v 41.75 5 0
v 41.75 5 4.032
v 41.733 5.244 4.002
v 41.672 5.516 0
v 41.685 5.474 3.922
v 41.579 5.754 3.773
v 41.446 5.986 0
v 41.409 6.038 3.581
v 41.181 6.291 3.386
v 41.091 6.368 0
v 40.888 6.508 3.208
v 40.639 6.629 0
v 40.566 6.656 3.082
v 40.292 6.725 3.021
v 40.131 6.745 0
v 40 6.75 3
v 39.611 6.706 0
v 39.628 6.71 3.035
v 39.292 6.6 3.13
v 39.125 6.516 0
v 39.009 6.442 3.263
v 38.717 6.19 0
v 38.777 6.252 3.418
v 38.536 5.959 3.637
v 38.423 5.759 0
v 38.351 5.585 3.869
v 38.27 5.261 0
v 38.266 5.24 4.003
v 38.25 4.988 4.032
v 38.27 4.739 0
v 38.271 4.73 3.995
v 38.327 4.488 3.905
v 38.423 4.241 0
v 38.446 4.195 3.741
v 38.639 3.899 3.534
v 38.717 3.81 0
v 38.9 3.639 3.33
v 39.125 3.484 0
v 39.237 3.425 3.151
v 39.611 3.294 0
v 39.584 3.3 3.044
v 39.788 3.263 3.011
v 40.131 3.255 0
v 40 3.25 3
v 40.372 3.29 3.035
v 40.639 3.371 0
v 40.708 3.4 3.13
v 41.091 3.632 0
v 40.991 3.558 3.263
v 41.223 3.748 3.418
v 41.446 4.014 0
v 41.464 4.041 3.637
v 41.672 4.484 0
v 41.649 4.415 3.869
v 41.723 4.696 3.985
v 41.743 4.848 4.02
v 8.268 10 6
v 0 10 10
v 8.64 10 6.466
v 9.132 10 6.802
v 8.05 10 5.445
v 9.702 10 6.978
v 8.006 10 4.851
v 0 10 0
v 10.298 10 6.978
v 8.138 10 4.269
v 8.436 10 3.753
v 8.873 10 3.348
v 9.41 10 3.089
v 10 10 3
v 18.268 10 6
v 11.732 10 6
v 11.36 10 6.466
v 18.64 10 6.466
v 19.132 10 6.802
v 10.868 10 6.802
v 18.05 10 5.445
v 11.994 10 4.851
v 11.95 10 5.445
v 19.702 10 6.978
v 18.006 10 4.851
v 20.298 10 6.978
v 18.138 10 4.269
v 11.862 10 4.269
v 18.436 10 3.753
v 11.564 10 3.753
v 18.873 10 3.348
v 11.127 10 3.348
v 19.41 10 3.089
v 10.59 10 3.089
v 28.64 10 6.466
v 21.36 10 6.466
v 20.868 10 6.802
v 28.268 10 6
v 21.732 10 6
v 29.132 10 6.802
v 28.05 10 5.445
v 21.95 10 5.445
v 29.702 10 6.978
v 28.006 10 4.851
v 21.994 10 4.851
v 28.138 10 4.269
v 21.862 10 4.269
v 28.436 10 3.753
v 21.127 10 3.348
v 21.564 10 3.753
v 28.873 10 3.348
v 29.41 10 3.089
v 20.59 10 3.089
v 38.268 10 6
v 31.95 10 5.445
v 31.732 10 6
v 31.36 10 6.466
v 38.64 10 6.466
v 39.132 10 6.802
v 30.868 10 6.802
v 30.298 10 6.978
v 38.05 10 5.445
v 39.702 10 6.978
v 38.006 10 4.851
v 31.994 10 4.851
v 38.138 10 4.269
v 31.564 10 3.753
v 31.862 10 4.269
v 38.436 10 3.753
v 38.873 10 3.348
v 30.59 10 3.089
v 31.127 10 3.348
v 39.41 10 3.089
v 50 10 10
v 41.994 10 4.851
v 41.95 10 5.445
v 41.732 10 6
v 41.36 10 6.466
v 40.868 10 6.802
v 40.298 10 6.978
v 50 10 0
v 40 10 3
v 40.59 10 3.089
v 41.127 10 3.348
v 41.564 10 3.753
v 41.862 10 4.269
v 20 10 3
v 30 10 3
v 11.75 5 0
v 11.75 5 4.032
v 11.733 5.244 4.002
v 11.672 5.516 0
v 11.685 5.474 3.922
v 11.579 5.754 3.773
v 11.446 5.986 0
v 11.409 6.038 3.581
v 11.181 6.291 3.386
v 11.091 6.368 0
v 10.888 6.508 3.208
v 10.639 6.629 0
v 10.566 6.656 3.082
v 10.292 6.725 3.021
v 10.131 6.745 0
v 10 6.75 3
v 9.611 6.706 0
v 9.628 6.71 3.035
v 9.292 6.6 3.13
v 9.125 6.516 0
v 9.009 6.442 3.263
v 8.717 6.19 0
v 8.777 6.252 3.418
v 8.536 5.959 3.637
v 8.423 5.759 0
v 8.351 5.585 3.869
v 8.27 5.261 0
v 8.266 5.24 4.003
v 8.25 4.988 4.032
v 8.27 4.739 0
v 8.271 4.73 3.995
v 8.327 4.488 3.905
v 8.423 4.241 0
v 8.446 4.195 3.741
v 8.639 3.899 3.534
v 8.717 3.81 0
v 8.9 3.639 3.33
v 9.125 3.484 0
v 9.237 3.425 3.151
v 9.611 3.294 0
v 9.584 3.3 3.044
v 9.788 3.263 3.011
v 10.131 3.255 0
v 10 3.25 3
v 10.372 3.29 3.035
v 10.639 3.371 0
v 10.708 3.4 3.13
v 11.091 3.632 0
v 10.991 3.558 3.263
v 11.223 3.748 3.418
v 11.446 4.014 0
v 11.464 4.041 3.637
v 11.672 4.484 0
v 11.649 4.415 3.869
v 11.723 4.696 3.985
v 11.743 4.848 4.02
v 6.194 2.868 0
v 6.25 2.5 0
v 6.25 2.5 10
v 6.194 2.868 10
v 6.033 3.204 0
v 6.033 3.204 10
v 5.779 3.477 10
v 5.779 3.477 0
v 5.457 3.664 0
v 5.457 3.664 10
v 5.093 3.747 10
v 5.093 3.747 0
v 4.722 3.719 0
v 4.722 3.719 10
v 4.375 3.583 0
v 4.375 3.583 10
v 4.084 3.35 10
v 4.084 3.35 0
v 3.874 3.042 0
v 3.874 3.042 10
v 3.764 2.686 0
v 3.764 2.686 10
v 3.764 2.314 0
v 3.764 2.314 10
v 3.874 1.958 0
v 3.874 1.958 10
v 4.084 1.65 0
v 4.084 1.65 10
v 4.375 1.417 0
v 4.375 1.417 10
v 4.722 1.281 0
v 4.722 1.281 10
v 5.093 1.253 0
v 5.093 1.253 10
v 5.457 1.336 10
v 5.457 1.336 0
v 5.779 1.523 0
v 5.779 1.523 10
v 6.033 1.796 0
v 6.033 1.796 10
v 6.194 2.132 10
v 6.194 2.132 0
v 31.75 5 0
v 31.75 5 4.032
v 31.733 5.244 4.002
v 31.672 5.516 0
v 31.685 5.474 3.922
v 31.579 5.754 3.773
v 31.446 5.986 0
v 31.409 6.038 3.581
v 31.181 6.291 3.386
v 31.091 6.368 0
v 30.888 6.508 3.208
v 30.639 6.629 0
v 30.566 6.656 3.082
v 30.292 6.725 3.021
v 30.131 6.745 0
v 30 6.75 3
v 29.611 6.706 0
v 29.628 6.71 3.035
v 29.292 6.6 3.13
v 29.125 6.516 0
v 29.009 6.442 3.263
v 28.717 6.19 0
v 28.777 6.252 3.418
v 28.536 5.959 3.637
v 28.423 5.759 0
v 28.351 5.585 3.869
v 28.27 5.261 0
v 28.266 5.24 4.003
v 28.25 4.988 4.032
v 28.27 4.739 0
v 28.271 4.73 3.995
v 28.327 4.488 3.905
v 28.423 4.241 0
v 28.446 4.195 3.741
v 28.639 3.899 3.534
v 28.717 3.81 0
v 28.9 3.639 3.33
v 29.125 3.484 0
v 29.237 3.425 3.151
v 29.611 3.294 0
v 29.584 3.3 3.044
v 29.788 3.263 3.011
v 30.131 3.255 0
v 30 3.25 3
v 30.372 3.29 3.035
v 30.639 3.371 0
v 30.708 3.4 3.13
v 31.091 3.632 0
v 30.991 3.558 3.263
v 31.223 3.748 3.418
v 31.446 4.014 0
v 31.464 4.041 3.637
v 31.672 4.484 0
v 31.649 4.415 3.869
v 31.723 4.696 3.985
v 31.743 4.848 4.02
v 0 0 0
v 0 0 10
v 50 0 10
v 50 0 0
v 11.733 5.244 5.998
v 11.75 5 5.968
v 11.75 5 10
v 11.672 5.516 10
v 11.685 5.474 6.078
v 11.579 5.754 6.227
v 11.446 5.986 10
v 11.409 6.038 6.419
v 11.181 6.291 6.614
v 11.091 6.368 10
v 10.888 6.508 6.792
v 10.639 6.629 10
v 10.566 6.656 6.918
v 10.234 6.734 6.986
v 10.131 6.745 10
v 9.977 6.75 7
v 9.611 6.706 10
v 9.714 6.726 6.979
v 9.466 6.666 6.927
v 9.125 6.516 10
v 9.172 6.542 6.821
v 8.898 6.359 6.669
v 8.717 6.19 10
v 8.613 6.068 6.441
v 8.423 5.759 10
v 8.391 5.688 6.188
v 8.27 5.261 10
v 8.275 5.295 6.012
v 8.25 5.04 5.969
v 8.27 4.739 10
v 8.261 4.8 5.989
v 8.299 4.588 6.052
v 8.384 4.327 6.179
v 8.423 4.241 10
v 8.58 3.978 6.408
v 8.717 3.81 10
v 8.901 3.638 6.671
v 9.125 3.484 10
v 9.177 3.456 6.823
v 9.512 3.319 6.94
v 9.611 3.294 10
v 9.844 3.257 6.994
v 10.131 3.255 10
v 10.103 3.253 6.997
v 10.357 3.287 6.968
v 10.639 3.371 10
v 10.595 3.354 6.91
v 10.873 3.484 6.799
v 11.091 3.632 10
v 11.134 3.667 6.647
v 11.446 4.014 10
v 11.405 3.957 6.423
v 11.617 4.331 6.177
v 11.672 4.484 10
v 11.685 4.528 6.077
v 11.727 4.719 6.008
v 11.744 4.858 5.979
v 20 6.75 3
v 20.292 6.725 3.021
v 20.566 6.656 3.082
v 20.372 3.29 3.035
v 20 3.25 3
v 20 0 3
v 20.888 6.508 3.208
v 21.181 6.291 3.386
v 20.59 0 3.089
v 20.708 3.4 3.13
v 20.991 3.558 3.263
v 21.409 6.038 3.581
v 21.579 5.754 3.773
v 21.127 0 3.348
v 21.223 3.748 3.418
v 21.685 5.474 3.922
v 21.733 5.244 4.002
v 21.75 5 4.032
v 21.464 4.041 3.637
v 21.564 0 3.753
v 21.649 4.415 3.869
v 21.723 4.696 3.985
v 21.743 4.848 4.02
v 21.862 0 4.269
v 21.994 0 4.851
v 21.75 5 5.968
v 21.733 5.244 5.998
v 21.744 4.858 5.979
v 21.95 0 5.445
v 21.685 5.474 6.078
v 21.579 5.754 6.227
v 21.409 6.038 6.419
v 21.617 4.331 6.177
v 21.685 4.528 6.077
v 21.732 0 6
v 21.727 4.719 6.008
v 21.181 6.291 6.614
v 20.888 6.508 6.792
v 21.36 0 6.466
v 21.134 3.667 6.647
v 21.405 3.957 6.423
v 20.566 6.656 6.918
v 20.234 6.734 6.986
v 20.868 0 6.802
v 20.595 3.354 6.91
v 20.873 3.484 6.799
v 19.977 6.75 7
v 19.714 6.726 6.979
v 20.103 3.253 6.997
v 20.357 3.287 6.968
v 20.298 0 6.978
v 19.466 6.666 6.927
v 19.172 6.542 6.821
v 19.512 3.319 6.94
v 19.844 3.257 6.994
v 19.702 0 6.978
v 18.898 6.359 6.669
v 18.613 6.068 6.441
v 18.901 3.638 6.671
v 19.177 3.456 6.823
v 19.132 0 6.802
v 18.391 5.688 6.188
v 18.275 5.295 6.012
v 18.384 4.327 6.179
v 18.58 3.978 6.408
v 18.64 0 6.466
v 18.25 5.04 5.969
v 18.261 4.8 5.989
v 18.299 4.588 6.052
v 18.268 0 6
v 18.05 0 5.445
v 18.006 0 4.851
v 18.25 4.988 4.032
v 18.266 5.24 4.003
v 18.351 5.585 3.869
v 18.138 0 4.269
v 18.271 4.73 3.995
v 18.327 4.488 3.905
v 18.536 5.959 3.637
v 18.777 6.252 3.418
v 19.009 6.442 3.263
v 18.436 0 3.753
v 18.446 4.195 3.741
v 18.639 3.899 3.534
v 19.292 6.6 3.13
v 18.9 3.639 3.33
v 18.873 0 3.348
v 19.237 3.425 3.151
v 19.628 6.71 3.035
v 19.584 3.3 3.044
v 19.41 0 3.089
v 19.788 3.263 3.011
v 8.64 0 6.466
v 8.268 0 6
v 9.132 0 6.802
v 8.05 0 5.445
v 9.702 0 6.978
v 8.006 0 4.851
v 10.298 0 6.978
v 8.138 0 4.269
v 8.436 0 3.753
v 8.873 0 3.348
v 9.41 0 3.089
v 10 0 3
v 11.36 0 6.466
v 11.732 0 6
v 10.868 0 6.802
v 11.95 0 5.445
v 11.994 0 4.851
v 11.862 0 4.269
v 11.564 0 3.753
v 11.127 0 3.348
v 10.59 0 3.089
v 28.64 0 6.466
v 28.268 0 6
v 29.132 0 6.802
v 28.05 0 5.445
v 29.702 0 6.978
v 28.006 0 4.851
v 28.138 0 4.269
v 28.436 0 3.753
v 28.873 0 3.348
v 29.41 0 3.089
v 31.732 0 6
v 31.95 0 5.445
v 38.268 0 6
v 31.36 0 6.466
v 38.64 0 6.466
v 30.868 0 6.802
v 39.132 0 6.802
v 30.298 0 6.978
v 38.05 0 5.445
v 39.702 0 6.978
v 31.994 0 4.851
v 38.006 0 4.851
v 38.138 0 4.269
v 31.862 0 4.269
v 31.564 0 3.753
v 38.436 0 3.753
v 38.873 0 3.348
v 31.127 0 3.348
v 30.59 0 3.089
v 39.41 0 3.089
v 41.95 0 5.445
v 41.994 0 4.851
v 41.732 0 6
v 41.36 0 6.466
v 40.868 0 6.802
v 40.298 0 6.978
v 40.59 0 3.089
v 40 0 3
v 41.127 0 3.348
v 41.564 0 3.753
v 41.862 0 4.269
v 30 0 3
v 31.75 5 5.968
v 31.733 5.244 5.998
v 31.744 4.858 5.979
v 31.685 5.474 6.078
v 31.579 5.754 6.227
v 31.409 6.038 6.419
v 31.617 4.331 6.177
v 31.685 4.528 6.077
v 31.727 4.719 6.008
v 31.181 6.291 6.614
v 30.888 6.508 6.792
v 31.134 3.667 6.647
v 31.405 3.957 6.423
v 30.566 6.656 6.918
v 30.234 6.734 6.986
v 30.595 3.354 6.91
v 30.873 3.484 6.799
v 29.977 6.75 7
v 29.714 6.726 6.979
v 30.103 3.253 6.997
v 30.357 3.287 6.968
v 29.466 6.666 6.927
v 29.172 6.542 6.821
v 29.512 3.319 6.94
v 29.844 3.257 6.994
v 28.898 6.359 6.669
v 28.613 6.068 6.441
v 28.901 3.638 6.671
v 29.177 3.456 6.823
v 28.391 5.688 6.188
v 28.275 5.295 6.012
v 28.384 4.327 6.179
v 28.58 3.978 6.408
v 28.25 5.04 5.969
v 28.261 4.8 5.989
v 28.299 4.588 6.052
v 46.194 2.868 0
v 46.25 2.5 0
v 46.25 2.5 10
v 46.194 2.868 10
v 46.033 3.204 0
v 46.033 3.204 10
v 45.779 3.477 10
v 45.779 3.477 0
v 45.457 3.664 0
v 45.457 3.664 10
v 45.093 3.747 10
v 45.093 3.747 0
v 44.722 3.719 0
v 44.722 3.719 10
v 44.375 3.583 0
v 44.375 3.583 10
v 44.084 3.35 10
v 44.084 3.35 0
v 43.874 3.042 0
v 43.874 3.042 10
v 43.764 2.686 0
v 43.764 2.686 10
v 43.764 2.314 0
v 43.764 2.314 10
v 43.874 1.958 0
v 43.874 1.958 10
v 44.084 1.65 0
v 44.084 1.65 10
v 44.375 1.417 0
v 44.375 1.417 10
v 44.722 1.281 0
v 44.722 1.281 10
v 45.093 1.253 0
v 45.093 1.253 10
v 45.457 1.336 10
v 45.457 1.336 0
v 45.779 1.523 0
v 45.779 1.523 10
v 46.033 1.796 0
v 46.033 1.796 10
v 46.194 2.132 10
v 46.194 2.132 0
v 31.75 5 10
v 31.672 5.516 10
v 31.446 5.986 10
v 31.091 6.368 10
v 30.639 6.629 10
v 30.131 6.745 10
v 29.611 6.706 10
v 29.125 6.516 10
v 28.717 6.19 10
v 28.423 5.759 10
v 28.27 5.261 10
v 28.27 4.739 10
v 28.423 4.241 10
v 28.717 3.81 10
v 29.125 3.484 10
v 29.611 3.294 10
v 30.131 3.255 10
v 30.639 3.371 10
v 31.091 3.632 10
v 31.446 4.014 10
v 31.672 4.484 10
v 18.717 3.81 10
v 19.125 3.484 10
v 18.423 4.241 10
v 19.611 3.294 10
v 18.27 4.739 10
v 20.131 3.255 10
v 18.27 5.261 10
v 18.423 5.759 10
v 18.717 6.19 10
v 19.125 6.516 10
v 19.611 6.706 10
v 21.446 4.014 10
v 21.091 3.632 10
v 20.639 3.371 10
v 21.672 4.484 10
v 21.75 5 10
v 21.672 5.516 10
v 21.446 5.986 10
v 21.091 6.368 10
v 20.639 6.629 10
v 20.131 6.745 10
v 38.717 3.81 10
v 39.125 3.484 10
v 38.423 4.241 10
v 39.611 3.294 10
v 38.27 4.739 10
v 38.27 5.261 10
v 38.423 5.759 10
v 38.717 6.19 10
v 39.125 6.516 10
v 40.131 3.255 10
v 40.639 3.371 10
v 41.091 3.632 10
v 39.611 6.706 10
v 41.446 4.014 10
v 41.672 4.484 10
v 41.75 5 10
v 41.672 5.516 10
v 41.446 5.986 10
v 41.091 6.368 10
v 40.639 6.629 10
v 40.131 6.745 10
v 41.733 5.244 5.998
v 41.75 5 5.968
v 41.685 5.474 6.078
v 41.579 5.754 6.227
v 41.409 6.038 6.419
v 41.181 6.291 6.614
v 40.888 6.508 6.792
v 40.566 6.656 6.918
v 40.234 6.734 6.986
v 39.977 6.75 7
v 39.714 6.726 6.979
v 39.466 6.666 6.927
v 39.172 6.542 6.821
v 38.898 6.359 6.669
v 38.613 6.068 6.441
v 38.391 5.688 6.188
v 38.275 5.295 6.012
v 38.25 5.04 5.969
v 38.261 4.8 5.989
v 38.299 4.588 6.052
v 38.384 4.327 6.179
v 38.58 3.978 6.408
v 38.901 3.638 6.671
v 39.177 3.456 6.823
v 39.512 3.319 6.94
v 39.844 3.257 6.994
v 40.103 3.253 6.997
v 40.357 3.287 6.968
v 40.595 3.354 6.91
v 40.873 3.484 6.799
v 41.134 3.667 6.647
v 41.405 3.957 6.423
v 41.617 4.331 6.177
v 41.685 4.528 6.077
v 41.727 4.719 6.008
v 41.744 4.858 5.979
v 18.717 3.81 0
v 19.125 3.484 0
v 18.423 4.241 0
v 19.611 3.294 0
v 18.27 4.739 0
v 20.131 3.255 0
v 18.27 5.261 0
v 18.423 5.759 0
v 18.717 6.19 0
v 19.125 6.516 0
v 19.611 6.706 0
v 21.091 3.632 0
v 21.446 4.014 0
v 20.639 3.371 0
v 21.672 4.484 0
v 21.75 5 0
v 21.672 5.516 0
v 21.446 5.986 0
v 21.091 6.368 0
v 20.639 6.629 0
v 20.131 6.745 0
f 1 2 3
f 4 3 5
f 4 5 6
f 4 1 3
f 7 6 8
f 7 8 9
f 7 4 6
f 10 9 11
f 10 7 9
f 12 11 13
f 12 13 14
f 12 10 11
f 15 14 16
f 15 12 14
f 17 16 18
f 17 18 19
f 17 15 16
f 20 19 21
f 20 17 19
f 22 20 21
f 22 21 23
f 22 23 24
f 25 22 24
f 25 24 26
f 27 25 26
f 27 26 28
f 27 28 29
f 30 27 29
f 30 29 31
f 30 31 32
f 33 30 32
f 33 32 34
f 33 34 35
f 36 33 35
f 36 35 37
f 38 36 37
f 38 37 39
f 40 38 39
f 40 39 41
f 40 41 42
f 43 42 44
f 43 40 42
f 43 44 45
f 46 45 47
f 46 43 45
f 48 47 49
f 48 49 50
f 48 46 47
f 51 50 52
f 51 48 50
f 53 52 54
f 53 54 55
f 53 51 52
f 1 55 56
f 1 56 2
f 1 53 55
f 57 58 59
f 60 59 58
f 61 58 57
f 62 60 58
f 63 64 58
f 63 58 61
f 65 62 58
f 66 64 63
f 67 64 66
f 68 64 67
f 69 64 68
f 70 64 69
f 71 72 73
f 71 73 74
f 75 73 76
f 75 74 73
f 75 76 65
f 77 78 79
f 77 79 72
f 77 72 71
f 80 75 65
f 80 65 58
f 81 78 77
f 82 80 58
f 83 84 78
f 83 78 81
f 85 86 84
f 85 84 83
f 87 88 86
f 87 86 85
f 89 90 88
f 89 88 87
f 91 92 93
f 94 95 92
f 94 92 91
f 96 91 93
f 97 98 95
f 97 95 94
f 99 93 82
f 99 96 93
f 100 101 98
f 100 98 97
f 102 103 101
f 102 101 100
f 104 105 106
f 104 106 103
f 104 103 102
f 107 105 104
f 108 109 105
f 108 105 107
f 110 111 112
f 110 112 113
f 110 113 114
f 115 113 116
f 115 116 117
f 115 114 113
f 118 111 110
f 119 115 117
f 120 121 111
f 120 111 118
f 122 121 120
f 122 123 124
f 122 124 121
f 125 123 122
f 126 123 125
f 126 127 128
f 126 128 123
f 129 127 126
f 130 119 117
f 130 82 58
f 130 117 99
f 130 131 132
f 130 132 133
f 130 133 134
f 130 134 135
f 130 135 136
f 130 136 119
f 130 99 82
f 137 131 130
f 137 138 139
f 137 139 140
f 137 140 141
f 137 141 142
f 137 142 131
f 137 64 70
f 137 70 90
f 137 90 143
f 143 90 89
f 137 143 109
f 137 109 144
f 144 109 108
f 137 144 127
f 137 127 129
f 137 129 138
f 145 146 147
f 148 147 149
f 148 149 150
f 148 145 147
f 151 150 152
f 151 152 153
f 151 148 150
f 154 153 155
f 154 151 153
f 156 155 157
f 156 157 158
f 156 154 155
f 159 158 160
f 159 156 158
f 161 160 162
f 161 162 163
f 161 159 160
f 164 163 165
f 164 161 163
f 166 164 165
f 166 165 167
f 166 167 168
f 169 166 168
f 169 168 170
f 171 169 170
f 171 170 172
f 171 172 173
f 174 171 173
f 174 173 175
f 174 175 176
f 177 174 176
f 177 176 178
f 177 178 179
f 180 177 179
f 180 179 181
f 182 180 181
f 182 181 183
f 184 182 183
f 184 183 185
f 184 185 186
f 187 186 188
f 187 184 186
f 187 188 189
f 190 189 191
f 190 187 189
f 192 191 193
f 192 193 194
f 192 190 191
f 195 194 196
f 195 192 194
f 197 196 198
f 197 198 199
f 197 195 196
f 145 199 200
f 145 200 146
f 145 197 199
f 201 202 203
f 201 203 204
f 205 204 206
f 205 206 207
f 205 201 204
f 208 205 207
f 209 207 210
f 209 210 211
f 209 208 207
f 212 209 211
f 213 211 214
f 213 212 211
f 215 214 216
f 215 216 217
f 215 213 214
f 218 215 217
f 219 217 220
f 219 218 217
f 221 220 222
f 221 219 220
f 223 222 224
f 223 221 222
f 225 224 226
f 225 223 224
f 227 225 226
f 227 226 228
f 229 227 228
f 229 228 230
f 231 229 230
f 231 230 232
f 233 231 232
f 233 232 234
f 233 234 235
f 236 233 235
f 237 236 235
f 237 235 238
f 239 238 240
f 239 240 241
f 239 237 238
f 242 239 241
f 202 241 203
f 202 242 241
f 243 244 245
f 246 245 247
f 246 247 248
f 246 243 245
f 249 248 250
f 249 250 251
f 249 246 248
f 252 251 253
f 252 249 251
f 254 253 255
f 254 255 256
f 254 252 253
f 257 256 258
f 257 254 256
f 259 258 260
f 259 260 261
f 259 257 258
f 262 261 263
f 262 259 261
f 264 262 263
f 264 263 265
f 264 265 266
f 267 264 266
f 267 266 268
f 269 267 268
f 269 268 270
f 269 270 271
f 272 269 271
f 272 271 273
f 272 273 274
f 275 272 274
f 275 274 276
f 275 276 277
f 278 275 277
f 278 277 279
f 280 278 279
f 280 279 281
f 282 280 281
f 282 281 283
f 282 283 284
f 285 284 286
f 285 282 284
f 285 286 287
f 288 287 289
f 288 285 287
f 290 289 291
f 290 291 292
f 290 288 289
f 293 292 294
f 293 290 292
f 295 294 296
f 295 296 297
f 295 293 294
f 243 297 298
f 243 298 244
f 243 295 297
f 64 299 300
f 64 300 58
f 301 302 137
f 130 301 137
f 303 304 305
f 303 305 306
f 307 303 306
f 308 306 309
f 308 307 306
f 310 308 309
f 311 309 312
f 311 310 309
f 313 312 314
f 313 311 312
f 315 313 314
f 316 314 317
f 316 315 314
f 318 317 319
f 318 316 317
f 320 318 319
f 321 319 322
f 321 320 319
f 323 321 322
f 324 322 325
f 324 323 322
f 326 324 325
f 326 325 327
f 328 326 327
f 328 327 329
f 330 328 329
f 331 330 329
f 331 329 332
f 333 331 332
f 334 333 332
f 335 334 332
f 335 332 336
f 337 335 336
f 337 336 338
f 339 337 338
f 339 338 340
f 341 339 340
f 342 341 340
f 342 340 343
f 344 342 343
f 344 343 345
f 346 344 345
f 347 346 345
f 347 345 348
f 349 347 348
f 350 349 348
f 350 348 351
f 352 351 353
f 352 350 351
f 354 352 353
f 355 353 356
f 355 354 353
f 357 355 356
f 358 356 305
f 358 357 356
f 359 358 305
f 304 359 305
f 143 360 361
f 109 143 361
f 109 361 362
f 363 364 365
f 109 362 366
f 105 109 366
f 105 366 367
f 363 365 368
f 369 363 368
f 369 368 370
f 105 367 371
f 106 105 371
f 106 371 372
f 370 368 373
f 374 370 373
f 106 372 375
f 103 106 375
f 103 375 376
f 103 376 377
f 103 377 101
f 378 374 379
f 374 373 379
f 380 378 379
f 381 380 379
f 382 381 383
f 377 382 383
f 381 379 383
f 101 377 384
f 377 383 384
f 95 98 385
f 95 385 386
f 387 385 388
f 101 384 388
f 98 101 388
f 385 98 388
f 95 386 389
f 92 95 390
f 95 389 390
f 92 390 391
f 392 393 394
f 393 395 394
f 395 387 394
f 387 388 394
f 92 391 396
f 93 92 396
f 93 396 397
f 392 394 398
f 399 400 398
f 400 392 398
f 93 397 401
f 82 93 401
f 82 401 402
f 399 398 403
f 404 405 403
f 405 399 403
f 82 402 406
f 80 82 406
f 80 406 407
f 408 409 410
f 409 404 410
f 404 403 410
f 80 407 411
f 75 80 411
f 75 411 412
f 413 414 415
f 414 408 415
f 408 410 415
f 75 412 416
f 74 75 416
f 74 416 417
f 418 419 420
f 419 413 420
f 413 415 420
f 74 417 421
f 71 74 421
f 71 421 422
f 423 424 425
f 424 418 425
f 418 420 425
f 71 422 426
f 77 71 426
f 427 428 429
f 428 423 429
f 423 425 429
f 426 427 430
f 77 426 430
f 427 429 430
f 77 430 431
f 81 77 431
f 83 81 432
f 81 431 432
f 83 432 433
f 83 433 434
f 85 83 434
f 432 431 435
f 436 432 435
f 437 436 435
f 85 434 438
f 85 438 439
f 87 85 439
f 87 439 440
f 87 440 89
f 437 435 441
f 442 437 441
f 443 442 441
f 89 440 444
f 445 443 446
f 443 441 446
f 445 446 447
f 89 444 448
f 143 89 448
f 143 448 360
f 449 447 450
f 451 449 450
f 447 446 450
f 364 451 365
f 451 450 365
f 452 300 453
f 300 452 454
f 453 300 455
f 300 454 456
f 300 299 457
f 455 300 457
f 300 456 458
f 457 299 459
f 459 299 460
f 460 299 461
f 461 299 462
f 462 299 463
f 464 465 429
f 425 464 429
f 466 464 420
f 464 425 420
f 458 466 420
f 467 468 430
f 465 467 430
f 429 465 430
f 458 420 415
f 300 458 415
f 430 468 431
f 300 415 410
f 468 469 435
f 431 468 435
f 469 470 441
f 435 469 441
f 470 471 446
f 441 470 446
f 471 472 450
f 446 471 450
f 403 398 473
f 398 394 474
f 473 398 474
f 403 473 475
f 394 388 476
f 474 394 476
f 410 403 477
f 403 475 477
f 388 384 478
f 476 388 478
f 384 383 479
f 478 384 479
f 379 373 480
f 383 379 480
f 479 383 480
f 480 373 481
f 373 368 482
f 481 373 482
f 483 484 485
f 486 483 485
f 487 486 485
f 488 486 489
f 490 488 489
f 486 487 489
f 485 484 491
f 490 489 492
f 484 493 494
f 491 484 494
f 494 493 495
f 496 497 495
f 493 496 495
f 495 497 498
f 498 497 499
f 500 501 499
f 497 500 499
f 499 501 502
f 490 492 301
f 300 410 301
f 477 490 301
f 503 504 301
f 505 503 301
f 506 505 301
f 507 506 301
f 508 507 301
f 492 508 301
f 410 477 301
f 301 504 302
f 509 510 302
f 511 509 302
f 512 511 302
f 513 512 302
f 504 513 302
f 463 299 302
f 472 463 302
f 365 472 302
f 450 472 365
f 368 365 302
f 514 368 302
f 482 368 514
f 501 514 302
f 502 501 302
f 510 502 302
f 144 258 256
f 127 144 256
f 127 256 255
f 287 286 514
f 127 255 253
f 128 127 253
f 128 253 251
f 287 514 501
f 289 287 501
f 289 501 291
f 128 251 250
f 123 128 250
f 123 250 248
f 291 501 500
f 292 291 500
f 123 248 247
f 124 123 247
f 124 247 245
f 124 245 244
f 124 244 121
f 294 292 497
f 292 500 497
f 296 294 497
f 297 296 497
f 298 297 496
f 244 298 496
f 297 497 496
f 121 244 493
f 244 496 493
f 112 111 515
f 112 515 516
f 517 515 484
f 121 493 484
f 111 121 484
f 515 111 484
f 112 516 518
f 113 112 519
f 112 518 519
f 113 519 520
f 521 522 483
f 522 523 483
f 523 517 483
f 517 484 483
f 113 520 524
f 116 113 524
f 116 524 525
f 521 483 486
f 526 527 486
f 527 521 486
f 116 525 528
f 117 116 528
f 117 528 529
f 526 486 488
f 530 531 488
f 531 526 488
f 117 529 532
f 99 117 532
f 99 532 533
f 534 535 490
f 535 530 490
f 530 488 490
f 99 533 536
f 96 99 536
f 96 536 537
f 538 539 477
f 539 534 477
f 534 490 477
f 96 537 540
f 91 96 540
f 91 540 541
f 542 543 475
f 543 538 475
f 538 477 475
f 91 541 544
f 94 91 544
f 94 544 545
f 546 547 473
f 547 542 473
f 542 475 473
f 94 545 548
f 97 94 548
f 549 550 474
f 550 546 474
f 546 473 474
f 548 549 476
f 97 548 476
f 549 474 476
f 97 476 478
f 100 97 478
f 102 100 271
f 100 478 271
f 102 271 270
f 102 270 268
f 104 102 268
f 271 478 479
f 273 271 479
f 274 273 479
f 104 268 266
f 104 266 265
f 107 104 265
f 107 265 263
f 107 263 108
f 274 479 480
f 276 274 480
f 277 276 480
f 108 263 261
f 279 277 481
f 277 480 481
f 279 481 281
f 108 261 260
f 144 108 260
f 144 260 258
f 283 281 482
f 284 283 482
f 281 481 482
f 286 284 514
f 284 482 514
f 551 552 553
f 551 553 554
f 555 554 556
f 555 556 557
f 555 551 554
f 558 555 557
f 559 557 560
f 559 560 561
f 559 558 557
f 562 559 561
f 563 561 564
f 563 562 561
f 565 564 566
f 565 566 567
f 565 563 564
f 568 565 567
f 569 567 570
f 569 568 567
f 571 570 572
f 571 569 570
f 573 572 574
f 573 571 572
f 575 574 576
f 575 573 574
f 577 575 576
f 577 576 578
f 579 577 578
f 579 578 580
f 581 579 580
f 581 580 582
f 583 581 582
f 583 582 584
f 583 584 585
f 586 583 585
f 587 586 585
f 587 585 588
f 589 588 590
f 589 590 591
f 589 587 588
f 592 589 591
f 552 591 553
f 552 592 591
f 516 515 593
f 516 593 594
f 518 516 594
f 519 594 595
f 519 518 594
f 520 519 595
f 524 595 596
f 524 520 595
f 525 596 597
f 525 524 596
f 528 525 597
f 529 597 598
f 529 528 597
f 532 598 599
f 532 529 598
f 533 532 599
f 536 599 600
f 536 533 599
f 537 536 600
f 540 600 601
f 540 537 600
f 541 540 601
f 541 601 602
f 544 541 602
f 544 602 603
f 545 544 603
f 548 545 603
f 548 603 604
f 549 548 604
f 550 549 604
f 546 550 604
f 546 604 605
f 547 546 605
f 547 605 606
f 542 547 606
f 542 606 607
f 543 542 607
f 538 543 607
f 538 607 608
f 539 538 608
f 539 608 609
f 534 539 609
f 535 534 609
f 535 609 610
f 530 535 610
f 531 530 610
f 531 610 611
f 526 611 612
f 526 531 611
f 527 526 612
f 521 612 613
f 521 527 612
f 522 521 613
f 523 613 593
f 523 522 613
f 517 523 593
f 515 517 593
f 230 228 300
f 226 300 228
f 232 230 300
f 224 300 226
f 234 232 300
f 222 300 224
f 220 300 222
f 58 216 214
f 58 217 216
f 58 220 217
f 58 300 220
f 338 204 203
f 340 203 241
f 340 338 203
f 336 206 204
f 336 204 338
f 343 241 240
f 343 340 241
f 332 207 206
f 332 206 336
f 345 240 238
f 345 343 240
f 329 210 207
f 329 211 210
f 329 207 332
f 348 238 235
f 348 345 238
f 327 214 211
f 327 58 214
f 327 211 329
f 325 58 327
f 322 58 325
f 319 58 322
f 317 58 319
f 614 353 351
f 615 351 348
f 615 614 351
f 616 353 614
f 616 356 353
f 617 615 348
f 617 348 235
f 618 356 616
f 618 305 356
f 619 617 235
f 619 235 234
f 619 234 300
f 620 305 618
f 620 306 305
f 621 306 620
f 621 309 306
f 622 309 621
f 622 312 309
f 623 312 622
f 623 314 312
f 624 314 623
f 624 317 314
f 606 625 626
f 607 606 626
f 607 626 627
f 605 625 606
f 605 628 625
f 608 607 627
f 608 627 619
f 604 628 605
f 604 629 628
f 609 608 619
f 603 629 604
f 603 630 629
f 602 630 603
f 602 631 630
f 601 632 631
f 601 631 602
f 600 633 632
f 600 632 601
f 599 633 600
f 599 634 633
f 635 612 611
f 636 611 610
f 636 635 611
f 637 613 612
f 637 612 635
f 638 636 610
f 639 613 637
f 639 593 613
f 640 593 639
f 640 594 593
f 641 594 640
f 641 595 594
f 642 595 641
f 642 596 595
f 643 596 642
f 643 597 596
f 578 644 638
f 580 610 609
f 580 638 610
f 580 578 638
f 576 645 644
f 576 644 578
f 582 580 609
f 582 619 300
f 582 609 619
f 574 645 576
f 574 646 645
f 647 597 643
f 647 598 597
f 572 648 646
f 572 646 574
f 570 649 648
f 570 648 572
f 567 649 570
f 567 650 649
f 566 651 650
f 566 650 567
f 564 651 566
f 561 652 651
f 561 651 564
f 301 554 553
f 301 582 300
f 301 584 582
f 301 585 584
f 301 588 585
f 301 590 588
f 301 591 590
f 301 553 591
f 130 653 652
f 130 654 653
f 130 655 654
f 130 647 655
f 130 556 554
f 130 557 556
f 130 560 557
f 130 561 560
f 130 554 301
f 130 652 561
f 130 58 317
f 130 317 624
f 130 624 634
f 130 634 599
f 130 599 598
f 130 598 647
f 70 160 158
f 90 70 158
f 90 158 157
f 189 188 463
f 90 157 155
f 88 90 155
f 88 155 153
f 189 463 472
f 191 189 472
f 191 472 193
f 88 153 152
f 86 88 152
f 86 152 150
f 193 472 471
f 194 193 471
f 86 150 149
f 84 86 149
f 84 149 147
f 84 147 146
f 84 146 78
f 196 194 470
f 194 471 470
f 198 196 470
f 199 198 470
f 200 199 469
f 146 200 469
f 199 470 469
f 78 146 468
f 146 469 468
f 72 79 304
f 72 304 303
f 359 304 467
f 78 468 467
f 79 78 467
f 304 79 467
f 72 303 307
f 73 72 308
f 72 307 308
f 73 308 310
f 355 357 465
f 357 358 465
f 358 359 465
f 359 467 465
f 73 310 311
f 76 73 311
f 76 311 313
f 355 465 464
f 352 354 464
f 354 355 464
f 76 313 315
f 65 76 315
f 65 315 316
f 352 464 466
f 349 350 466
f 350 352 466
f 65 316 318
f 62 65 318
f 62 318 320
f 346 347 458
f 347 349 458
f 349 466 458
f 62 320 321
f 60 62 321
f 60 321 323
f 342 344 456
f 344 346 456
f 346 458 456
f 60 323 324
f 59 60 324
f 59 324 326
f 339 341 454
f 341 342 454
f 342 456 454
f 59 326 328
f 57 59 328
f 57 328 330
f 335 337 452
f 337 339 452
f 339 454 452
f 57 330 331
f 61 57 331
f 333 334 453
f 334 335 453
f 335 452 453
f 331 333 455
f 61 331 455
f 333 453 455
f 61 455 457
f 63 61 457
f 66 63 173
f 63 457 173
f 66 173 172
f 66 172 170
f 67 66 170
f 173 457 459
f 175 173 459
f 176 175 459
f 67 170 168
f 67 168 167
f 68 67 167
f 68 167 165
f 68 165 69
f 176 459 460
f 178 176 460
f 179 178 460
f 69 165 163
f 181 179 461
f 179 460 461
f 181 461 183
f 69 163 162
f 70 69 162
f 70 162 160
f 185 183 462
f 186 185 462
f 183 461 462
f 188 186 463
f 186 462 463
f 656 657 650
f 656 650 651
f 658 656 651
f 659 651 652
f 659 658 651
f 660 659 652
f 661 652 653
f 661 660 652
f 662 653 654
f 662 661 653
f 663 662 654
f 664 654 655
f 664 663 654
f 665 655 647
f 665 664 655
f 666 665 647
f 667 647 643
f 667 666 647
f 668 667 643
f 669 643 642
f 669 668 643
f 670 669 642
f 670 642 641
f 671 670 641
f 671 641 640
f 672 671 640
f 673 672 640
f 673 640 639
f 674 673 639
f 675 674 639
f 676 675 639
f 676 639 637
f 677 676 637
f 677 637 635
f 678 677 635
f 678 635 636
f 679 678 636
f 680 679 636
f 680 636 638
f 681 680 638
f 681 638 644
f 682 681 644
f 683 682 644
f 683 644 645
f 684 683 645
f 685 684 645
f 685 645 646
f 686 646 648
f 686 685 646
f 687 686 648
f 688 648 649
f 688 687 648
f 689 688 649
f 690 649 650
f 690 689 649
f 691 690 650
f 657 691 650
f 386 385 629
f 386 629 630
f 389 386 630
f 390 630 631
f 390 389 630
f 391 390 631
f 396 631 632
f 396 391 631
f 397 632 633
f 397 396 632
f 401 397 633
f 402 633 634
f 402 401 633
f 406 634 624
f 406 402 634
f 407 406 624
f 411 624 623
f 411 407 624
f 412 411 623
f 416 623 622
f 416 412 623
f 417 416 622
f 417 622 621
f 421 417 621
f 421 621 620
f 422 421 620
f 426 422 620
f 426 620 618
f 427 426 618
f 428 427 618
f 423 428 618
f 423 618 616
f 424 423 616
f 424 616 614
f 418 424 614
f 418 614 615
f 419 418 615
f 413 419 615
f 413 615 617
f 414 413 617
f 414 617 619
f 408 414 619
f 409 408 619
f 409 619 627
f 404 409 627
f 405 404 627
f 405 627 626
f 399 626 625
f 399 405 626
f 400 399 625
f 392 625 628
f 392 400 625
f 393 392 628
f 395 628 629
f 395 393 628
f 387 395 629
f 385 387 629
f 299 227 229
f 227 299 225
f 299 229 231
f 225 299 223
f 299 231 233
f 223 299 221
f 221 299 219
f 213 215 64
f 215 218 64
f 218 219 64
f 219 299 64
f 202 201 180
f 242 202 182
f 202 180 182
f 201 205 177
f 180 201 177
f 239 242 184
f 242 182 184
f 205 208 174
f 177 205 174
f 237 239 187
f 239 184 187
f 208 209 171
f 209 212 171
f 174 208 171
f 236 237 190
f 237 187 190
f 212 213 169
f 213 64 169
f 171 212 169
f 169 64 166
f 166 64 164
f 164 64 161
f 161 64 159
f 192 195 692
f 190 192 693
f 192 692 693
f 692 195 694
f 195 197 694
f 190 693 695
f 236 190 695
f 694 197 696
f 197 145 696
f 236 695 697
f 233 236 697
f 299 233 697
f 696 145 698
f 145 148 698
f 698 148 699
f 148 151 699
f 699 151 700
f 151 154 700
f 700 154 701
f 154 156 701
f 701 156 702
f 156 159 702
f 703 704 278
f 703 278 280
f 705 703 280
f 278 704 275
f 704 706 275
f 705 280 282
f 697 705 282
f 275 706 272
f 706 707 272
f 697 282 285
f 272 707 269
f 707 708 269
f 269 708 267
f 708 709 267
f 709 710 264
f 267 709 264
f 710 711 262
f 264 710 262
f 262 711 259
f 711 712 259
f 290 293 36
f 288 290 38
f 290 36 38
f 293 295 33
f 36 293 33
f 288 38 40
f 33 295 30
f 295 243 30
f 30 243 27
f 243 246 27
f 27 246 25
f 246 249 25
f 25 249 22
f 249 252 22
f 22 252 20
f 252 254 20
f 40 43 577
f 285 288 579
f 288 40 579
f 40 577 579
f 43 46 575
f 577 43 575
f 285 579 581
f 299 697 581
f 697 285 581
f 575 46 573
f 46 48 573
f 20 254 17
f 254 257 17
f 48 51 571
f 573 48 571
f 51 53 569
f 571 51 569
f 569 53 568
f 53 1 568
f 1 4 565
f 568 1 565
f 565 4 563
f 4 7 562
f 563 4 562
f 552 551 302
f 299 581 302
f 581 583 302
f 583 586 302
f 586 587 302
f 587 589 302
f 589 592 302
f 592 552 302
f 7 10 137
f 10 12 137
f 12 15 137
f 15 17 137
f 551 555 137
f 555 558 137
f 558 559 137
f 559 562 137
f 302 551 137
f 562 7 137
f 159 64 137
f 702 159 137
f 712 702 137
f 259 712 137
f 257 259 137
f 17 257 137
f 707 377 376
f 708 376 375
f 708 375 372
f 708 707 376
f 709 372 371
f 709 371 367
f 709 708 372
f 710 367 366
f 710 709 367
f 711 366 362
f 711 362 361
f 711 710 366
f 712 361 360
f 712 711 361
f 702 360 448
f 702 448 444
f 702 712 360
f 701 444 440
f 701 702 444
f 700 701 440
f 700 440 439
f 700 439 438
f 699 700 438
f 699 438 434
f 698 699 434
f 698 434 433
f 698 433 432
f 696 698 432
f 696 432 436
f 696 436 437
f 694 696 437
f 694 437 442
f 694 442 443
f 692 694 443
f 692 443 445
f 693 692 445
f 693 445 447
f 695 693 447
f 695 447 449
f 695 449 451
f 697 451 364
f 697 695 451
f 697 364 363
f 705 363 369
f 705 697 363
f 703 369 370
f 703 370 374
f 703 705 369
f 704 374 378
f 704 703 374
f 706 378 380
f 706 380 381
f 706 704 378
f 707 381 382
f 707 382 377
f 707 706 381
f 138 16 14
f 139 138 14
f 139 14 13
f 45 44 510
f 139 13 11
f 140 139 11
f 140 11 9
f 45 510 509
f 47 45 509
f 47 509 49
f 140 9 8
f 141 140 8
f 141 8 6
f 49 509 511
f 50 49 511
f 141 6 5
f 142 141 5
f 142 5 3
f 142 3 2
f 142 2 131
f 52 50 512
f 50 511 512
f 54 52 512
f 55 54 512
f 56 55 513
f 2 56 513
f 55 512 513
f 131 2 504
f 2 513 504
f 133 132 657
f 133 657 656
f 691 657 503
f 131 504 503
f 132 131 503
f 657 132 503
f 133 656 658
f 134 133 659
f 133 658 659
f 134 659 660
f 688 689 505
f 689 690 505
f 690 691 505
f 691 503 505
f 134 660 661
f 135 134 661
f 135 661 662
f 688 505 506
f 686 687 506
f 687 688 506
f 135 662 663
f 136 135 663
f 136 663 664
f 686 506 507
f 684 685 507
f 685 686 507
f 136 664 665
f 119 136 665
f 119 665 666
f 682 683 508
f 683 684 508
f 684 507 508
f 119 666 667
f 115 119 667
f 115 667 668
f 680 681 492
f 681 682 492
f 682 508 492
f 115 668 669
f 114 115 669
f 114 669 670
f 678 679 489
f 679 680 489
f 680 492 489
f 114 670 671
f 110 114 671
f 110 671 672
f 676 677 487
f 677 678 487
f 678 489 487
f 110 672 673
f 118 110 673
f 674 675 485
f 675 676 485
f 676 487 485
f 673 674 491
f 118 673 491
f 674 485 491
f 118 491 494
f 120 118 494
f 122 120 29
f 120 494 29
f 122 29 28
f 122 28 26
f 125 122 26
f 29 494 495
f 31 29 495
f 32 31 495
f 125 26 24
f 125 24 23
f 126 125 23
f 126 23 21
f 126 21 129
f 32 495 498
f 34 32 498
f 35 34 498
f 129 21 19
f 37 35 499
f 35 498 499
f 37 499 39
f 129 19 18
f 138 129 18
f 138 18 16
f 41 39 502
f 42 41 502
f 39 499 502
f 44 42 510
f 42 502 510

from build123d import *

# Parameters (mm, degrees)
ESQUISSE1_W             = 50
ESQUISSE1_H             = 10
ESQUISSE1_R             = 1.25
ESQUISSE1_R_2           = 1.75
BOSS_EXTRU_1_DEPTH      = 10
ESQUISSE2_R             = 2
ENL_V_MAT_EXTRU_1_DEPTH = 10


with BuildPart() as part:
    # Esquisse1 → Boss.-Extru.1 (new body)
    with BuildSketch(Plane.XY):
        with Locations((25, 5)):
            Rectangle(ESQUISSE1_W, ESQUISSE1_H)
        with Locations((5, 2.5)):
            Circle(ESQUISSE1_R, mode=Mode.SUBTRACT)
        with Locations((45, 2.5)):
            Circle(ESQUISSE1_R, mode=Mode.SUBTRACT)
        with Locations((40, 5)):
            Circle(ESQUISSE1_R_2, mode=Mode.SUBTRACT)
        with Locations((30, 5)):
            Circle(ESQUISSE1_R_2, mode=Mode.SUBTRACT)
        with Locations((20, 5)):
            Circle(ESQUISSE1_R_2, mode=Mode.SUBTRACT)
        with Locations((10, 5)):
            Circle(ESQUISSE1_R_2, mode=Mode.SUBTRACT)
    extrude(amount=BOSS_EXTRU_1_DEPTH)

    # Esquisse2 → Enlèv. mat.-Extru.1 (cut)
    with BuildSketch(Plane.XZ):
        with Locations(Location((40, 5, 0), (0, 0, 270))):
            Circle(ESQUISSE2_R)
        with Locations(Location((30, 5, 0), (0, 0, 270))):
            Circle(ESQUISSE2_R)
        with Locations(Location((20, 5, 0), (0, 0, 270))):
            Circle(ESQUISSE2_R)
        with Locations(Location((10, 5, 0), (0, 0, 270))):
            Circle(ESQUISSE2_R)
    extrude(amount=-ENL_V_MAT_EXTRU_1_DEPTH, mode=Mode.SUBTRACT)


solid = part.part
